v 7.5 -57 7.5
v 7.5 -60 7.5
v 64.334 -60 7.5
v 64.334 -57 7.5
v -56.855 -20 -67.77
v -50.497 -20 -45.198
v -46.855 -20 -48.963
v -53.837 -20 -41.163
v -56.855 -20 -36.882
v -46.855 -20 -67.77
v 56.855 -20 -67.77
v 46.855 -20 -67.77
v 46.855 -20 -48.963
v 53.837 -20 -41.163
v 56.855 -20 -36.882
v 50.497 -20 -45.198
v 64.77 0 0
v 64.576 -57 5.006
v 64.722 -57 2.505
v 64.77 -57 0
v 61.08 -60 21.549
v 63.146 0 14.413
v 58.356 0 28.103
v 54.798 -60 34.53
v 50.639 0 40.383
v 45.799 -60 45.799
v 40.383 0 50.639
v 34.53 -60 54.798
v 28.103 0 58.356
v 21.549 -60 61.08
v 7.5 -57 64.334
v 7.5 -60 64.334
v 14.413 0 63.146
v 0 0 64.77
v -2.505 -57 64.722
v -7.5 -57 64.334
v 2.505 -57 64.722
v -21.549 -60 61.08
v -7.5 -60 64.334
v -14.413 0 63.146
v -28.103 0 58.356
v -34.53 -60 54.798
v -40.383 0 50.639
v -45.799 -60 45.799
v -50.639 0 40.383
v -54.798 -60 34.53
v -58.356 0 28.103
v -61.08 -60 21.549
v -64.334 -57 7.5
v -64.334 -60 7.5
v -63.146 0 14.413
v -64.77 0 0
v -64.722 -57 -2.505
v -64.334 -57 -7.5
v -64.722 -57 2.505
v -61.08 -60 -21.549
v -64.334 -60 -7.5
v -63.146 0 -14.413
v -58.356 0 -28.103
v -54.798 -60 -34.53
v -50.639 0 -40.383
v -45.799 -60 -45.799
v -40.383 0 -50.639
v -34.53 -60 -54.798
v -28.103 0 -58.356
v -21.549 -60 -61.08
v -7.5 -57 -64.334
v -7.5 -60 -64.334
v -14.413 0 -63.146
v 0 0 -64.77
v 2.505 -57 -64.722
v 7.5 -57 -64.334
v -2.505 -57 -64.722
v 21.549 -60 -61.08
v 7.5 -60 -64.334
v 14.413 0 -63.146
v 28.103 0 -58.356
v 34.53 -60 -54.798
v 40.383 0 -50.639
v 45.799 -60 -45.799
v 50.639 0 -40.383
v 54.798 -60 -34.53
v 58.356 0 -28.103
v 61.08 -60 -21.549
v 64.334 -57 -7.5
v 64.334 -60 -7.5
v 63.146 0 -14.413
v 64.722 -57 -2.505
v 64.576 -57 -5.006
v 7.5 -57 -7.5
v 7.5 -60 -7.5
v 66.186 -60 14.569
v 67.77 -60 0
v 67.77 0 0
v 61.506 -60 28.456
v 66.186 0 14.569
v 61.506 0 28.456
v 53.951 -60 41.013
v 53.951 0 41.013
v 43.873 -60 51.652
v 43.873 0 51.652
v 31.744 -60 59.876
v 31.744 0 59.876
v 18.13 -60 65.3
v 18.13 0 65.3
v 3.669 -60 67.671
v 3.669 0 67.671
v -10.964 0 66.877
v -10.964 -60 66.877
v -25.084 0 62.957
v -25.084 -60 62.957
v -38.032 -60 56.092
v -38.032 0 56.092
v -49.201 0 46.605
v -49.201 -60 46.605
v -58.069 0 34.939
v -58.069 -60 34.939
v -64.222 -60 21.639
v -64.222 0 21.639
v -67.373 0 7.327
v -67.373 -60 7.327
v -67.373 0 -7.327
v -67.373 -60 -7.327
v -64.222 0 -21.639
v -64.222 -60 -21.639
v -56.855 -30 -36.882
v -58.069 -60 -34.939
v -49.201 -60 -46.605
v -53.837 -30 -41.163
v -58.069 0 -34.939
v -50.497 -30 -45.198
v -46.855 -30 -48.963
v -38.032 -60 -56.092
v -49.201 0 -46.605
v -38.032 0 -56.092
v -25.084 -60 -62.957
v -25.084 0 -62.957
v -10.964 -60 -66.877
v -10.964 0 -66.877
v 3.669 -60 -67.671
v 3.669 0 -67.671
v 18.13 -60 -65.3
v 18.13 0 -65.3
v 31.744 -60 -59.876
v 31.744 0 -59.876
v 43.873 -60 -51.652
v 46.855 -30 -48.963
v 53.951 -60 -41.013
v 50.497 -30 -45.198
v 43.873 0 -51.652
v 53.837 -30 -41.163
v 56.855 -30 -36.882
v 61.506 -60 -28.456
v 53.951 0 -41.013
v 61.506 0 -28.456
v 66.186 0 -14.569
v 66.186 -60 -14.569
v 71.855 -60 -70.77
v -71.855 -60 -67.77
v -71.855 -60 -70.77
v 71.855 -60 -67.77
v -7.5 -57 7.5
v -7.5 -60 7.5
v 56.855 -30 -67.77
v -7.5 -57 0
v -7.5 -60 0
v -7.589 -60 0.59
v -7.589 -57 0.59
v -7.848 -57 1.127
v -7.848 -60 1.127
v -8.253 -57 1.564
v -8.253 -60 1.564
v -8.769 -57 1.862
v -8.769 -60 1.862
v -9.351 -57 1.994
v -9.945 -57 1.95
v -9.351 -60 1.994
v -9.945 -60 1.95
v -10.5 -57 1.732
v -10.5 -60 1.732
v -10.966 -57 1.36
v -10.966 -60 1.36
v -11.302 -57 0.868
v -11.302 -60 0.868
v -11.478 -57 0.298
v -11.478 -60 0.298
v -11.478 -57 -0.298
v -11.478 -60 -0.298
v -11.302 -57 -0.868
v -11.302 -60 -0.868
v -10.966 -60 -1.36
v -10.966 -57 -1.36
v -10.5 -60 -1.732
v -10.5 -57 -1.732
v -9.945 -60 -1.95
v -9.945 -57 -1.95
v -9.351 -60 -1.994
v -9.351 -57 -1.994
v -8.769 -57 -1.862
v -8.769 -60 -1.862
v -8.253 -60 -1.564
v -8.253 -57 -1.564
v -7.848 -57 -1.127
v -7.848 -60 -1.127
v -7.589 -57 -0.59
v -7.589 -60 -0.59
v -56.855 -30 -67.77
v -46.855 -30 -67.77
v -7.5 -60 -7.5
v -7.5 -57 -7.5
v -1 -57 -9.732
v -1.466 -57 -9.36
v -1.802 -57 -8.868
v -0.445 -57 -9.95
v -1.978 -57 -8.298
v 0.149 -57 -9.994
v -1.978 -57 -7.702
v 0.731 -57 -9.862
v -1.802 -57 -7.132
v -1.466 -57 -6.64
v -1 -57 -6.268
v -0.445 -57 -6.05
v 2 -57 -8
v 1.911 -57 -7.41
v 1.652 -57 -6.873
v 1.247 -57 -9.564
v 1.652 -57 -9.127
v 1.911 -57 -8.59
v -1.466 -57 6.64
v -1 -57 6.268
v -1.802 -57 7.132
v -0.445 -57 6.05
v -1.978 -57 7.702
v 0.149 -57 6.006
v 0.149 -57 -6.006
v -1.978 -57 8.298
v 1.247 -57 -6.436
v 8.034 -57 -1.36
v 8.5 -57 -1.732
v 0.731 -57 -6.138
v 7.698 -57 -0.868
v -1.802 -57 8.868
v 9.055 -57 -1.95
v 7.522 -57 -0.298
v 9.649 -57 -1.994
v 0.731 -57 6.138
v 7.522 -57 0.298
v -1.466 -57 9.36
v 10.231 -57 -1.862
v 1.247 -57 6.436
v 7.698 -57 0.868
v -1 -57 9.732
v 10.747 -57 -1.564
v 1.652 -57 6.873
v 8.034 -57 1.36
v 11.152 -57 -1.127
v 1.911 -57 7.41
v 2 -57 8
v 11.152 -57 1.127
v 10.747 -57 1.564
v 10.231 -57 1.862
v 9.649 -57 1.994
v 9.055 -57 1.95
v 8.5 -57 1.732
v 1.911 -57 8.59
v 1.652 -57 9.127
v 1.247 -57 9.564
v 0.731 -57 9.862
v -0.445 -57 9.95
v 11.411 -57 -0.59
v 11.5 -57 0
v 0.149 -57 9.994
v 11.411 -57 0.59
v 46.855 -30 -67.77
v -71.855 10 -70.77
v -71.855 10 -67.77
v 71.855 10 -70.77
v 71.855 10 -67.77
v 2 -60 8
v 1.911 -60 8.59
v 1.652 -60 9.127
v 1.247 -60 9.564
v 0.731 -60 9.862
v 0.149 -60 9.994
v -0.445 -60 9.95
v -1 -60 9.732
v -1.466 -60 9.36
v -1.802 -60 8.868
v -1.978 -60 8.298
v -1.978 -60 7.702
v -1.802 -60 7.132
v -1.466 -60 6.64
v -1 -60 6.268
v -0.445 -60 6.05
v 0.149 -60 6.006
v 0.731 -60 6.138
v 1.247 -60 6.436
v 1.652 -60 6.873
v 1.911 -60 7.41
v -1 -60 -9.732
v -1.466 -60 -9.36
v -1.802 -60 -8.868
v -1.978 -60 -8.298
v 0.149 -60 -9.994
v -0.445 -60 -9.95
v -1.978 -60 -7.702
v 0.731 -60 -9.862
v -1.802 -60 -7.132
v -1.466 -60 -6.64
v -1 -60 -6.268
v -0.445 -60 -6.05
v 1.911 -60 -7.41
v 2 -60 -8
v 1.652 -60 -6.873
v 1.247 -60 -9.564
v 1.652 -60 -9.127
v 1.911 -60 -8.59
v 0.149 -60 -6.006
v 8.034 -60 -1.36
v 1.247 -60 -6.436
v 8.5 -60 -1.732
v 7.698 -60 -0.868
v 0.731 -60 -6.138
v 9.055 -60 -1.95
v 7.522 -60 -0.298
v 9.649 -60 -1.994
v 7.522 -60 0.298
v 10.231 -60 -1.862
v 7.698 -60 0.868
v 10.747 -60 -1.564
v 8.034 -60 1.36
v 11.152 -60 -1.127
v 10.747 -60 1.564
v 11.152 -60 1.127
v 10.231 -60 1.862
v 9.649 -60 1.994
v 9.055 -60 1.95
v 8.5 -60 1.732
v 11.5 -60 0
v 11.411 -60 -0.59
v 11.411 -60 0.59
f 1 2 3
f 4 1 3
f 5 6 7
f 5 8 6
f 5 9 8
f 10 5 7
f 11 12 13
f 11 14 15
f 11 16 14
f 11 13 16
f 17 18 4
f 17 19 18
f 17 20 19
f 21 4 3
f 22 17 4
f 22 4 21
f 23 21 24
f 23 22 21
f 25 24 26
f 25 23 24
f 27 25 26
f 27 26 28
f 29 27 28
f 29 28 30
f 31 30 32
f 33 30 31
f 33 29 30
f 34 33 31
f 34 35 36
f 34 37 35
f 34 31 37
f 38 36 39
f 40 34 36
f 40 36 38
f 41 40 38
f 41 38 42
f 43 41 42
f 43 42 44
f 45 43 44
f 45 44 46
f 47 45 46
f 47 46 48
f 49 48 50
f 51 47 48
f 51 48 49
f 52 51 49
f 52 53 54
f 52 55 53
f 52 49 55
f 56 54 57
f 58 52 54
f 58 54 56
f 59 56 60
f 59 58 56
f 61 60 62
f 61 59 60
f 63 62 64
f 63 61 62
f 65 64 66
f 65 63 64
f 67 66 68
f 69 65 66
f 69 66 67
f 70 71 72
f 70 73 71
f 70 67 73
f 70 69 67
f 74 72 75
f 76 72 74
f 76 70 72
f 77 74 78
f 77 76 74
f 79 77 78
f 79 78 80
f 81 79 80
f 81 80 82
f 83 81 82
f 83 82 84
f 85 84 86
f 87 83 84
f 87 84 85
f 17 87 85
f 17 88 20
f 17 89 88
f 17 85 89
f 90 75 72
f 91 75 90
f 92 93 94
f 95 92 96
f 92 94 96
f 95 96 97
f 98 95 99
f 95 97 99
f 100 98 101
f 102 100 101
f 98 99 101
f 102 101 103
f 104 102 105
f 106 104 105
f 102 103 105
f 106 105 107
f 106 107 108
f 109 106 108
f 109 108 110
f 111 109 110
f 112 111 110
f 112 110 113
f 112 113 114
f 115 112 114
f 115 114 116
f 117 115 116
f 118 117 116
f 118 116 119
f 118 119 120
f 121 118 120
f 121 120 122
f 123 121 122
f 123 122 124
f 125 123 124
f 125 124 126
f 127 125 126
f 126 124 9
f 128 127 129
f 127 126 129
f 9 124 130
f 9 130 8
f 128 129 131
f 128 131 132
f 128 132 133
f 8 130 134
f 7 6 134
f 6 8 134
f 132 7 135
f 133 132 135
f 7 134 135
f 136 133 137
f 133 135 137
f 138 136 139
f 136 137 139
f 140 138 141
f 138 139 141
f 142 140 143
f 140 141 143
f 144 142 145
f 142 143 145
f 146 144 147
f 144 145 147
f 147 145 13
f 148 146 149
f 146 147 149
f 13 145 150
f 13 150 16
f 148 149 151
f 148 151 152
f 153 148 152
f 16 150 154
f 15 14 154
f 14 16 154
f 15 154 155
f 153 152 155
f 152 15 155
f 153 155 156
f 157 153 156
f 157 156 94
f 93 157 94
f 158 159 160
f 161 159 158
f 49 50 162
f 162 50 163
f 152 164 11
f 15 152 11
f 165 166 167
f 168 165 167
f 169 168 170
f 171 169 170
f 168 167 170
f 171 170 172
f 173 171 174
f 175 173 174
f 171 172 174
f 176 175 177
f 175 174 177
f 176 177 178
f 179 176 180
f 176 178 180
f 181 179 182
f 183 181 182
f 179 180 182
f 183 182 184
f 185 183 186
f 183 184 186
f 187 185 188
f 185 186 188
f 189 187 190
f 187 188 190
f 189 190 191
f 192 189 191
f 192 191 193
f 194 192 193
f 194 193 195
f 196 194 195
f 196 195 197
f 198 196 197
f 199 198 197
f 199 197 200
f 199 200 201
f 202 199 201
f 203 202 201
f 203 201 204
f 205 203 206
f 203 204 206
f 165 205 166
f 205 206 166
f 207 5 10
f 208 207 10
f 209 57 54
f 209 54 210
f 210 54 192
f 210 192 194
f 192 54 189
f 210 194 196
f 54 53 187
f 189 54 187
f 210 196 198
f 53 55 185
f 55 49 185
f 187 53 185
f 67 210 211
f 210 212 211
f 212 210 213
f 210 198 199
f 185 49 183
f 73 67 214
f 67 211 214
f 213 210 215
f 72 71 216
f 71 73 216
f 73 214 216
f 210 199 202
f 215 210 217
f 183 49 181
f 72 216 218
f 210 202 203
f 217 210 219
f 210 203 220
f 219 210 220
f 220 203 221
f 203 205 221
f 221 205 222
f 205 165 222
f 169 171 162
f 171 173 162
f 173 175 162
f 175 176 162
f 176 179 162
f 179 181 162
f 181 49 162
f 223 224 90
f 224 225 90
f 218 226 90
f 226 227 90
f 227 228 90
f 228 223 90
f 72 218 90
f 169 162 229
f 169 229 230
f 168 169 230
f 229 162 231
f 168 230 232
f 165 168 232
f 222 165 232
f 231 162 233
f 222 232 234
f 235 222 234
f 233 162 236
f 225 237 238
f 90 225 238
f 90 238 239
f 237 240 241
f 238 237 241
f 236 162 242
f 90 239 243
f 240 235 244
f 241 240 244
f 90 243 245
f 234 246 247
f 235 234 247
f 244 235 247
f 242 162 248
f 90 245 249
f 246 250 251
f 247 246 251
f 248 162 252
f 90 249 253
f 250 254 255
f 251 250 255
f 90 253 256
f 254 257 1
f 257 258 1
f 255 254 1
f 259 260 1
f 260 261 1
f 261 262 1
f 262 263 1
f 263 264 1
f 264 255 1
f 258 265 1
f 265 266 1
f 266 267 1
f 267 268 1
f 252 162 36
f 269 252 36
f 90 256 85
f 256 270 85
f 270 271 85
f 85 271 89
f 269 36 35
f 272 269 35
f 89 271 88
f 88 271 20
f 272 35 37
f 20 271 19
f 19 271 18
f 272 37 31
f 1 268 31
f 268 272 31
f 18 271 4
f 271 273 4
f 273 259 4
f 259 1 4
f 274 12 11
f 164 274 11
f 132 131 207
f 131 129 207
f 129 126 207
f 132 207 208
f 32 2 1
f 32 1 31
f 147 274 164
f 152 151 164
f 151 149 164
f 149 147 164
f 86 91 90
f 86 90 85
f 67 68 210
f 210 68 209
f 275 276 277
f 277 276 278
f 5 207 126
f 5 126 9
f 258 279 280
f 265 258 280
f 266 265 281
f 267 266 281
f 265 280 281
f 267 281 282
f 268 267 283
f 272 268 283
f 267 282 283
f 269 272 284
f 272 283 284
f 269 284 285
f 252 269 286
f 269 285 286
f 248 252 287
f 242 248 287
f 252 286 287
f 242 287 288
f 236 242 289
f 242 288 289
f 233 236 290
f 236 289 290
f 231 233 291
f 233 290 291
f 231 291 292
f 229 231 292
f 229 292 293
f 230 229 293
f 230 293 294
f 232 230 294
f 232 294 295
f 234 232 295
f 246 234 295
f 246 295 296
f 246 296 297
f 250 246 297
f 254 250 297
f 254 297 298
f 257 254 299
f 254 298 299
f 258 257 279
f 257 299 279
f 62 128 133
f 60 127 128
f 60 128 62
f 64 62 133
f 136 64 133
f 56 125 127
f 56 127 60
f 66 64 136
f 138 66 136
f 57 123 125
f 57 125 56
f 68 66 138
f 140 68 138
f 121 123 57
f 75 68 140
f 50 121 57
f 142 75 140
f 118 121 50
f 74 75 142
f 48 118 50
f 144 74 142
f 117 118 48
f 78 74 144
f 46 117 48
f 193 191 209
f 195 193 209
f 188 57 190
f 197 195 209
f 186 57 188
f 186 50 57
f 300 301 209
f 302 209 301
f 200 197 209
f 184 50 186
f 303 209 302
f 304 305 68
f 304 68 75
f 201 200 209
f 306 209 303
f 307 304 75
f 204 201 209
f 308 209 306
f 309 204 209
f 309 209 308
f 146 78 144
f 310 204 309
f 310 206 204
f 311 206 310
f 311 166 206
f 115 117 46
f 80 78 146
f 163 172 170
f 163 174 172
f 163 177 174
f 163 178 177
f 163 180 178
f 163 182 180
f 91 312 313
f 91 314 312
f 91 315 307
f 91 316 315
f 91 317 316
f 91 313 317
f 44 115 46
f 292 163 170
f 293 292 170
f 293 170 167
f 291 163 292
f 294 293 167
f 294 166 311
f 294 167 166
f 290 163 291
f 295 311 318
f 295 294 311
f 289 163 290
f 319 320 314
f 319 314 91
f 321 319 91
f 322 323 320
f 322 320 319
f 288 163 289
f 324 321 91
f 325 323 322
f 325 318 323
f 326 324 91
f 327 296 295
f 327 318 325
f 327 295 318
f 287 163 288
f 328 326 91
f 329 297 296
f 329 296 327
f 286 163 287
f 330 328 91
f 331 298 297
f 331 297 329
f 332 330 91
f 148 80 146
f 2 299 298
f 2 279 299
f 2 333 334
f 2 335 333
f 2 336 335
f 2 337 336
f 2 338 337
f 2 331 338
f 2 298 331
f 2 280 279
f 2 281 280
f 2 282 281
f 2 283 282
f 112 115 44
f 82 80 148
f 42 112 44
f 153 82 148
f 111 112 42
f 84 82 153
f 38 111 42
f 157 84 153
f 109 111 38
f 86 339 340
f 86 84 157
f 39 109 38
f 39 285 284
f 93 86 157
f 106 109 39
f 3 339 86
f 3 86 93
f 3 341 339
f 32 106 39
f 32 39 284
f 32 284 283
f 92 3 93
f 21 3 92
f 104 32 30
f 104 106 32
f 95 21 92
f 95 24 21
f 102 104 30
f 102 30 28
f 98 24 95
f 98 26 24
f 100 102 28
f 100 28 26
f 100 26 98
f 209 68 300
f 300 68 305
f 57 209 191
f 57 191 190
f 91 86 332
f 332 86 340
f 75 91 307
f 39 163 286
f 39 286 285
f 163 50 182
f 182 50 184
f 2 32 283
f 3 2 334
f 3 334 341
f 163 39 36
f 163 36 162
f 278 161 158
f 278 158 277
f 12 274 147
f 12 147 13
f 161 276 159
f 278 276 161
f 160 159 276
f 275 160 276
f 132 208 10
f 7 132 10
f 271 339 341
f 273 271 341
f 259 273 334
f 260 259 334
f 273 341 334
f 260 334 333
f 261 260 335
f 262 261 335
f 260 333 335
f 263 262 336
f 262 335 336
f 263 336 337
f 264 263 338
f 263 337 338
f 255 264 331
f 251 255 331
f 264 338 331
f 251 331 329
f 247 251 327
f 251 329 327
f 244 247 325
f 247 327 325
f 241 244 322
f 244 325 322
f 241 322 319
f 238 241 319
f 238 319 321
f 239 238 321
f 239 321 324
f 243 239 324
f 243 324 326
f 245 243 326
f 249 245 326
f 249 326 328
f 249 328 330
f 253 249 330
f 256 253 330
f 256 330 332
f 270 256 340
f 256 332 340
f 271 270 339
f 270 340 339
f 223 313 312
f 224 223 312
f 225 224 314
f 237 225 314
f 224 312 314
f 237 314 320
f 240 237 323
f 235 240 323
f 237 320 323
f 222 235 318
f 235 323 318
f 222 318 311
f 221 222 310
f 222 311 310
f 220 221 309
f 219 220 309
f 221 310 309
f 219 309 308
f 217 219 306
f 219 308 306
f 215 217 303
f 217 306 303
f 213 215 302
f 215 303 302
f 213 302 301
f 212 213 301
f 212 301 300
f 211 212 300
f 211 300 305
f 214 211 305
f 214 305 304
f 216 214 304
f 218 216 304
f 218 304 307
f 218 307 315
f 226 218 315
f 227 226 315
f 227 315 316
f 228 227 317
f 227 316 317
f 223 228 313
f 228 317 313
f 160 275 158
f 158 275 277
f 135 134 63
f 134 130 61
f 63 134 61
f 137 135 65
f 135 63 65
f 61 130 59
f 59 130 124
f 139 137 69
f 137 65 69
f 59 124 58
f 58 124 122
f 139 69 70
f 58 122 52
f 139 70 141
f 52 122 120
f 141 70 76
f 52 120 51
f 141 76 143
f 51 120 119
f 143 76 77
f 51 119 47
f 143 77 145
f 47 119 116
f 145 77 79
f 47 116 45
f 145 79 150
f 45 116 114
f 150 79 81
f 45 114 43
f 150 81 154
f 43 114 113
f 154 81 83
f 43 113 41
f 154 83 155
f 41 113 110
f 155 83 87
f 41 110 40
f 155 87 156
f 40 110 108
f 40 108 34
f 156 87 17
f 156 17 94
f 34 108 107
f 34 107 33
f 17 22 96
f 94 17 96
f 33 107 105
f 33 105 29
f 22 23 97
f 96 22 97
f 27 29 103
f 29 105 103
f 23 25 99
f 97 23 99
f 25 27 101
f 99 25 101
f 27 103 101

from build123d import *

# Parameters (mm, degrees)
F0_R        = 67.77
F1_DEPTH    = 60
F2_T        = -3
F4_W        = 143.71
F4_H        = 70
F5_DEPTH    = 3
F6_W        = 10
F6_H        = 10
F7_DEPTH    = 35
F8_T4_DEPTH = 77.0795565602
F8_S5_R     = 64.77
F8_T6_DEPTH = 41
F9_T4_DEPTH = 77.0795565602
F9_S5_R     = 64.77
F9_T6_DEPTH = 41
F10_W       = 15
F10_H       = 57.5
F10_W_2     = 57.5
F10_H_2     = 15
F11_DEPTH   = 3
F12_R       = 2
F13_DEPTH   = 3


# Not quite as in the source:
# - a fillet or chamfer that OpenCascade refuses, or shapes differently, is made with other operations: its cross-section is extruded or revolved along the edge and cut away or added


with BuildPart() as f1:
    # F0 (on Front) → F1 (new body)
    with BuildSketch(Plane.XZ):
        Circle(F0_R)
    extrude(amount=F1_DEPTH)

    # F2
    f2_openings = [f1.faces().sort_by_distance(p)[0] for p in [
        (0, -60, 0),
        (0, 0, 0),
    ]]
    offset(amount=F2_T, openings=f2_openings)

    # F6 (on face) → F7 (join)
    with BuildSketch(Plane.XY.offset(-67.77)):
        with Locations((-51.855, -25)):
            Rectangle(F6_W, F6_H)
        with Locations((51.855, -25)):
            Rectangle(F6_W, F6_H)
    extrude(amount=F7_DEPTH)

    # F8: chamfer of 10 x 13 on 1 edges, made by hand


with BuildPart() as f5:
    # F4 (on offset) → F5 (new body)
    with BuildSketch(Plane.XY.offset(-67.77)):
        with Locations((0, -25)):
            Rectangle(F4_W, F4_H)
    extrude(amount=-F5_DEPTH)


with BuildPart() as f8_tool2:
    # F8_s3 → F8_t4 (new body)
    with BuildSketch(Plane.XZ.offset(63.5397782801)):
        Polygon((-46.855, -45.77), (-56.855, -32.77), (-46.855, -32.77), align=None)
    extrude(amount=-F8_T4_DEPTH)

    # F8_s5 → F8_t6 (intersect, symmetric)
    with BuildSketch(Plane.XZ.offset(25)):
        Circle(F8_S5_R)
    extrude(amount=F8_T6_DEPTH, both=True, mode=Mode.INTERSECT)


with BuildPart() as f1_1:
    add(f1.part)

    # F8_t1: cut F8_tool2
    add(f8_tool2.part, mode=Mode.SUBTRACT)

    # F9: chamfer of 13 x 10 on 1 edges, made by hand


with BuildPart() as f9_tool2:
    # F9_s3 → F9_t4 (new body)
    with BuildSketch(Plane.XZ.offset(-13.5397782801)):
        Polygon((46.855, -45.77), (56.855, -32.77), (46.855, -32.77), align=None)
    extrude(amount=F9_T4_DEPTH)

    # F9_s5 → F9_t6 (intersect, symmetric)
    with BuildSketch(Plane.XZ.offset(25)):
        Circle(F9_S5_R)
    extrude(amount=F9_T6_DEPTH, both=True, mode=Mode.INTERSECT)


with BuildPart() as f1_2:
    add(f1_1.part)

    # F9_t1: cut F9_tool2
    add(f9_tool2.part, mode=Mode.SUBTRACT)

    # F10 (on face) → F11 (join)
    with BuildSketch(Plane.XZ.offset(60)):
        with Locations((0, 36.25)):
            Rectangle(F10_W, F10_H)
        with Locations((36.25, 0)):
            Rectangle(F10_W_2, F10_H_2)
        Rectangle(F10_W, F10_H_2)
        with Locations((-36.25, 0)):
            Rectangle(F10_W_2, F10_H_2)
        with Locations((0, -36.25)):
            Rectangle(F10_W, F10_H)
    extrude(amount=-F11_DEPTH)

    # F12 (on face) → F13 (cut)
    with BuildSketch(Plane.XZ.offset(60)):
        with Locations((0, 8)):
            Circle(F12_R)
        with Locations((9.5, 0)):
            Circle(F12_R)
        with Locations((-9.5, 0)):
            Circle(F12_R)
        with Locations((0, -8)):
            Circle(F12_R)
    extrude(amount=-F13_DEPTH, mode=Mode.SUBTRACT)


solid = Compound([f5.part, f1_2.part])
